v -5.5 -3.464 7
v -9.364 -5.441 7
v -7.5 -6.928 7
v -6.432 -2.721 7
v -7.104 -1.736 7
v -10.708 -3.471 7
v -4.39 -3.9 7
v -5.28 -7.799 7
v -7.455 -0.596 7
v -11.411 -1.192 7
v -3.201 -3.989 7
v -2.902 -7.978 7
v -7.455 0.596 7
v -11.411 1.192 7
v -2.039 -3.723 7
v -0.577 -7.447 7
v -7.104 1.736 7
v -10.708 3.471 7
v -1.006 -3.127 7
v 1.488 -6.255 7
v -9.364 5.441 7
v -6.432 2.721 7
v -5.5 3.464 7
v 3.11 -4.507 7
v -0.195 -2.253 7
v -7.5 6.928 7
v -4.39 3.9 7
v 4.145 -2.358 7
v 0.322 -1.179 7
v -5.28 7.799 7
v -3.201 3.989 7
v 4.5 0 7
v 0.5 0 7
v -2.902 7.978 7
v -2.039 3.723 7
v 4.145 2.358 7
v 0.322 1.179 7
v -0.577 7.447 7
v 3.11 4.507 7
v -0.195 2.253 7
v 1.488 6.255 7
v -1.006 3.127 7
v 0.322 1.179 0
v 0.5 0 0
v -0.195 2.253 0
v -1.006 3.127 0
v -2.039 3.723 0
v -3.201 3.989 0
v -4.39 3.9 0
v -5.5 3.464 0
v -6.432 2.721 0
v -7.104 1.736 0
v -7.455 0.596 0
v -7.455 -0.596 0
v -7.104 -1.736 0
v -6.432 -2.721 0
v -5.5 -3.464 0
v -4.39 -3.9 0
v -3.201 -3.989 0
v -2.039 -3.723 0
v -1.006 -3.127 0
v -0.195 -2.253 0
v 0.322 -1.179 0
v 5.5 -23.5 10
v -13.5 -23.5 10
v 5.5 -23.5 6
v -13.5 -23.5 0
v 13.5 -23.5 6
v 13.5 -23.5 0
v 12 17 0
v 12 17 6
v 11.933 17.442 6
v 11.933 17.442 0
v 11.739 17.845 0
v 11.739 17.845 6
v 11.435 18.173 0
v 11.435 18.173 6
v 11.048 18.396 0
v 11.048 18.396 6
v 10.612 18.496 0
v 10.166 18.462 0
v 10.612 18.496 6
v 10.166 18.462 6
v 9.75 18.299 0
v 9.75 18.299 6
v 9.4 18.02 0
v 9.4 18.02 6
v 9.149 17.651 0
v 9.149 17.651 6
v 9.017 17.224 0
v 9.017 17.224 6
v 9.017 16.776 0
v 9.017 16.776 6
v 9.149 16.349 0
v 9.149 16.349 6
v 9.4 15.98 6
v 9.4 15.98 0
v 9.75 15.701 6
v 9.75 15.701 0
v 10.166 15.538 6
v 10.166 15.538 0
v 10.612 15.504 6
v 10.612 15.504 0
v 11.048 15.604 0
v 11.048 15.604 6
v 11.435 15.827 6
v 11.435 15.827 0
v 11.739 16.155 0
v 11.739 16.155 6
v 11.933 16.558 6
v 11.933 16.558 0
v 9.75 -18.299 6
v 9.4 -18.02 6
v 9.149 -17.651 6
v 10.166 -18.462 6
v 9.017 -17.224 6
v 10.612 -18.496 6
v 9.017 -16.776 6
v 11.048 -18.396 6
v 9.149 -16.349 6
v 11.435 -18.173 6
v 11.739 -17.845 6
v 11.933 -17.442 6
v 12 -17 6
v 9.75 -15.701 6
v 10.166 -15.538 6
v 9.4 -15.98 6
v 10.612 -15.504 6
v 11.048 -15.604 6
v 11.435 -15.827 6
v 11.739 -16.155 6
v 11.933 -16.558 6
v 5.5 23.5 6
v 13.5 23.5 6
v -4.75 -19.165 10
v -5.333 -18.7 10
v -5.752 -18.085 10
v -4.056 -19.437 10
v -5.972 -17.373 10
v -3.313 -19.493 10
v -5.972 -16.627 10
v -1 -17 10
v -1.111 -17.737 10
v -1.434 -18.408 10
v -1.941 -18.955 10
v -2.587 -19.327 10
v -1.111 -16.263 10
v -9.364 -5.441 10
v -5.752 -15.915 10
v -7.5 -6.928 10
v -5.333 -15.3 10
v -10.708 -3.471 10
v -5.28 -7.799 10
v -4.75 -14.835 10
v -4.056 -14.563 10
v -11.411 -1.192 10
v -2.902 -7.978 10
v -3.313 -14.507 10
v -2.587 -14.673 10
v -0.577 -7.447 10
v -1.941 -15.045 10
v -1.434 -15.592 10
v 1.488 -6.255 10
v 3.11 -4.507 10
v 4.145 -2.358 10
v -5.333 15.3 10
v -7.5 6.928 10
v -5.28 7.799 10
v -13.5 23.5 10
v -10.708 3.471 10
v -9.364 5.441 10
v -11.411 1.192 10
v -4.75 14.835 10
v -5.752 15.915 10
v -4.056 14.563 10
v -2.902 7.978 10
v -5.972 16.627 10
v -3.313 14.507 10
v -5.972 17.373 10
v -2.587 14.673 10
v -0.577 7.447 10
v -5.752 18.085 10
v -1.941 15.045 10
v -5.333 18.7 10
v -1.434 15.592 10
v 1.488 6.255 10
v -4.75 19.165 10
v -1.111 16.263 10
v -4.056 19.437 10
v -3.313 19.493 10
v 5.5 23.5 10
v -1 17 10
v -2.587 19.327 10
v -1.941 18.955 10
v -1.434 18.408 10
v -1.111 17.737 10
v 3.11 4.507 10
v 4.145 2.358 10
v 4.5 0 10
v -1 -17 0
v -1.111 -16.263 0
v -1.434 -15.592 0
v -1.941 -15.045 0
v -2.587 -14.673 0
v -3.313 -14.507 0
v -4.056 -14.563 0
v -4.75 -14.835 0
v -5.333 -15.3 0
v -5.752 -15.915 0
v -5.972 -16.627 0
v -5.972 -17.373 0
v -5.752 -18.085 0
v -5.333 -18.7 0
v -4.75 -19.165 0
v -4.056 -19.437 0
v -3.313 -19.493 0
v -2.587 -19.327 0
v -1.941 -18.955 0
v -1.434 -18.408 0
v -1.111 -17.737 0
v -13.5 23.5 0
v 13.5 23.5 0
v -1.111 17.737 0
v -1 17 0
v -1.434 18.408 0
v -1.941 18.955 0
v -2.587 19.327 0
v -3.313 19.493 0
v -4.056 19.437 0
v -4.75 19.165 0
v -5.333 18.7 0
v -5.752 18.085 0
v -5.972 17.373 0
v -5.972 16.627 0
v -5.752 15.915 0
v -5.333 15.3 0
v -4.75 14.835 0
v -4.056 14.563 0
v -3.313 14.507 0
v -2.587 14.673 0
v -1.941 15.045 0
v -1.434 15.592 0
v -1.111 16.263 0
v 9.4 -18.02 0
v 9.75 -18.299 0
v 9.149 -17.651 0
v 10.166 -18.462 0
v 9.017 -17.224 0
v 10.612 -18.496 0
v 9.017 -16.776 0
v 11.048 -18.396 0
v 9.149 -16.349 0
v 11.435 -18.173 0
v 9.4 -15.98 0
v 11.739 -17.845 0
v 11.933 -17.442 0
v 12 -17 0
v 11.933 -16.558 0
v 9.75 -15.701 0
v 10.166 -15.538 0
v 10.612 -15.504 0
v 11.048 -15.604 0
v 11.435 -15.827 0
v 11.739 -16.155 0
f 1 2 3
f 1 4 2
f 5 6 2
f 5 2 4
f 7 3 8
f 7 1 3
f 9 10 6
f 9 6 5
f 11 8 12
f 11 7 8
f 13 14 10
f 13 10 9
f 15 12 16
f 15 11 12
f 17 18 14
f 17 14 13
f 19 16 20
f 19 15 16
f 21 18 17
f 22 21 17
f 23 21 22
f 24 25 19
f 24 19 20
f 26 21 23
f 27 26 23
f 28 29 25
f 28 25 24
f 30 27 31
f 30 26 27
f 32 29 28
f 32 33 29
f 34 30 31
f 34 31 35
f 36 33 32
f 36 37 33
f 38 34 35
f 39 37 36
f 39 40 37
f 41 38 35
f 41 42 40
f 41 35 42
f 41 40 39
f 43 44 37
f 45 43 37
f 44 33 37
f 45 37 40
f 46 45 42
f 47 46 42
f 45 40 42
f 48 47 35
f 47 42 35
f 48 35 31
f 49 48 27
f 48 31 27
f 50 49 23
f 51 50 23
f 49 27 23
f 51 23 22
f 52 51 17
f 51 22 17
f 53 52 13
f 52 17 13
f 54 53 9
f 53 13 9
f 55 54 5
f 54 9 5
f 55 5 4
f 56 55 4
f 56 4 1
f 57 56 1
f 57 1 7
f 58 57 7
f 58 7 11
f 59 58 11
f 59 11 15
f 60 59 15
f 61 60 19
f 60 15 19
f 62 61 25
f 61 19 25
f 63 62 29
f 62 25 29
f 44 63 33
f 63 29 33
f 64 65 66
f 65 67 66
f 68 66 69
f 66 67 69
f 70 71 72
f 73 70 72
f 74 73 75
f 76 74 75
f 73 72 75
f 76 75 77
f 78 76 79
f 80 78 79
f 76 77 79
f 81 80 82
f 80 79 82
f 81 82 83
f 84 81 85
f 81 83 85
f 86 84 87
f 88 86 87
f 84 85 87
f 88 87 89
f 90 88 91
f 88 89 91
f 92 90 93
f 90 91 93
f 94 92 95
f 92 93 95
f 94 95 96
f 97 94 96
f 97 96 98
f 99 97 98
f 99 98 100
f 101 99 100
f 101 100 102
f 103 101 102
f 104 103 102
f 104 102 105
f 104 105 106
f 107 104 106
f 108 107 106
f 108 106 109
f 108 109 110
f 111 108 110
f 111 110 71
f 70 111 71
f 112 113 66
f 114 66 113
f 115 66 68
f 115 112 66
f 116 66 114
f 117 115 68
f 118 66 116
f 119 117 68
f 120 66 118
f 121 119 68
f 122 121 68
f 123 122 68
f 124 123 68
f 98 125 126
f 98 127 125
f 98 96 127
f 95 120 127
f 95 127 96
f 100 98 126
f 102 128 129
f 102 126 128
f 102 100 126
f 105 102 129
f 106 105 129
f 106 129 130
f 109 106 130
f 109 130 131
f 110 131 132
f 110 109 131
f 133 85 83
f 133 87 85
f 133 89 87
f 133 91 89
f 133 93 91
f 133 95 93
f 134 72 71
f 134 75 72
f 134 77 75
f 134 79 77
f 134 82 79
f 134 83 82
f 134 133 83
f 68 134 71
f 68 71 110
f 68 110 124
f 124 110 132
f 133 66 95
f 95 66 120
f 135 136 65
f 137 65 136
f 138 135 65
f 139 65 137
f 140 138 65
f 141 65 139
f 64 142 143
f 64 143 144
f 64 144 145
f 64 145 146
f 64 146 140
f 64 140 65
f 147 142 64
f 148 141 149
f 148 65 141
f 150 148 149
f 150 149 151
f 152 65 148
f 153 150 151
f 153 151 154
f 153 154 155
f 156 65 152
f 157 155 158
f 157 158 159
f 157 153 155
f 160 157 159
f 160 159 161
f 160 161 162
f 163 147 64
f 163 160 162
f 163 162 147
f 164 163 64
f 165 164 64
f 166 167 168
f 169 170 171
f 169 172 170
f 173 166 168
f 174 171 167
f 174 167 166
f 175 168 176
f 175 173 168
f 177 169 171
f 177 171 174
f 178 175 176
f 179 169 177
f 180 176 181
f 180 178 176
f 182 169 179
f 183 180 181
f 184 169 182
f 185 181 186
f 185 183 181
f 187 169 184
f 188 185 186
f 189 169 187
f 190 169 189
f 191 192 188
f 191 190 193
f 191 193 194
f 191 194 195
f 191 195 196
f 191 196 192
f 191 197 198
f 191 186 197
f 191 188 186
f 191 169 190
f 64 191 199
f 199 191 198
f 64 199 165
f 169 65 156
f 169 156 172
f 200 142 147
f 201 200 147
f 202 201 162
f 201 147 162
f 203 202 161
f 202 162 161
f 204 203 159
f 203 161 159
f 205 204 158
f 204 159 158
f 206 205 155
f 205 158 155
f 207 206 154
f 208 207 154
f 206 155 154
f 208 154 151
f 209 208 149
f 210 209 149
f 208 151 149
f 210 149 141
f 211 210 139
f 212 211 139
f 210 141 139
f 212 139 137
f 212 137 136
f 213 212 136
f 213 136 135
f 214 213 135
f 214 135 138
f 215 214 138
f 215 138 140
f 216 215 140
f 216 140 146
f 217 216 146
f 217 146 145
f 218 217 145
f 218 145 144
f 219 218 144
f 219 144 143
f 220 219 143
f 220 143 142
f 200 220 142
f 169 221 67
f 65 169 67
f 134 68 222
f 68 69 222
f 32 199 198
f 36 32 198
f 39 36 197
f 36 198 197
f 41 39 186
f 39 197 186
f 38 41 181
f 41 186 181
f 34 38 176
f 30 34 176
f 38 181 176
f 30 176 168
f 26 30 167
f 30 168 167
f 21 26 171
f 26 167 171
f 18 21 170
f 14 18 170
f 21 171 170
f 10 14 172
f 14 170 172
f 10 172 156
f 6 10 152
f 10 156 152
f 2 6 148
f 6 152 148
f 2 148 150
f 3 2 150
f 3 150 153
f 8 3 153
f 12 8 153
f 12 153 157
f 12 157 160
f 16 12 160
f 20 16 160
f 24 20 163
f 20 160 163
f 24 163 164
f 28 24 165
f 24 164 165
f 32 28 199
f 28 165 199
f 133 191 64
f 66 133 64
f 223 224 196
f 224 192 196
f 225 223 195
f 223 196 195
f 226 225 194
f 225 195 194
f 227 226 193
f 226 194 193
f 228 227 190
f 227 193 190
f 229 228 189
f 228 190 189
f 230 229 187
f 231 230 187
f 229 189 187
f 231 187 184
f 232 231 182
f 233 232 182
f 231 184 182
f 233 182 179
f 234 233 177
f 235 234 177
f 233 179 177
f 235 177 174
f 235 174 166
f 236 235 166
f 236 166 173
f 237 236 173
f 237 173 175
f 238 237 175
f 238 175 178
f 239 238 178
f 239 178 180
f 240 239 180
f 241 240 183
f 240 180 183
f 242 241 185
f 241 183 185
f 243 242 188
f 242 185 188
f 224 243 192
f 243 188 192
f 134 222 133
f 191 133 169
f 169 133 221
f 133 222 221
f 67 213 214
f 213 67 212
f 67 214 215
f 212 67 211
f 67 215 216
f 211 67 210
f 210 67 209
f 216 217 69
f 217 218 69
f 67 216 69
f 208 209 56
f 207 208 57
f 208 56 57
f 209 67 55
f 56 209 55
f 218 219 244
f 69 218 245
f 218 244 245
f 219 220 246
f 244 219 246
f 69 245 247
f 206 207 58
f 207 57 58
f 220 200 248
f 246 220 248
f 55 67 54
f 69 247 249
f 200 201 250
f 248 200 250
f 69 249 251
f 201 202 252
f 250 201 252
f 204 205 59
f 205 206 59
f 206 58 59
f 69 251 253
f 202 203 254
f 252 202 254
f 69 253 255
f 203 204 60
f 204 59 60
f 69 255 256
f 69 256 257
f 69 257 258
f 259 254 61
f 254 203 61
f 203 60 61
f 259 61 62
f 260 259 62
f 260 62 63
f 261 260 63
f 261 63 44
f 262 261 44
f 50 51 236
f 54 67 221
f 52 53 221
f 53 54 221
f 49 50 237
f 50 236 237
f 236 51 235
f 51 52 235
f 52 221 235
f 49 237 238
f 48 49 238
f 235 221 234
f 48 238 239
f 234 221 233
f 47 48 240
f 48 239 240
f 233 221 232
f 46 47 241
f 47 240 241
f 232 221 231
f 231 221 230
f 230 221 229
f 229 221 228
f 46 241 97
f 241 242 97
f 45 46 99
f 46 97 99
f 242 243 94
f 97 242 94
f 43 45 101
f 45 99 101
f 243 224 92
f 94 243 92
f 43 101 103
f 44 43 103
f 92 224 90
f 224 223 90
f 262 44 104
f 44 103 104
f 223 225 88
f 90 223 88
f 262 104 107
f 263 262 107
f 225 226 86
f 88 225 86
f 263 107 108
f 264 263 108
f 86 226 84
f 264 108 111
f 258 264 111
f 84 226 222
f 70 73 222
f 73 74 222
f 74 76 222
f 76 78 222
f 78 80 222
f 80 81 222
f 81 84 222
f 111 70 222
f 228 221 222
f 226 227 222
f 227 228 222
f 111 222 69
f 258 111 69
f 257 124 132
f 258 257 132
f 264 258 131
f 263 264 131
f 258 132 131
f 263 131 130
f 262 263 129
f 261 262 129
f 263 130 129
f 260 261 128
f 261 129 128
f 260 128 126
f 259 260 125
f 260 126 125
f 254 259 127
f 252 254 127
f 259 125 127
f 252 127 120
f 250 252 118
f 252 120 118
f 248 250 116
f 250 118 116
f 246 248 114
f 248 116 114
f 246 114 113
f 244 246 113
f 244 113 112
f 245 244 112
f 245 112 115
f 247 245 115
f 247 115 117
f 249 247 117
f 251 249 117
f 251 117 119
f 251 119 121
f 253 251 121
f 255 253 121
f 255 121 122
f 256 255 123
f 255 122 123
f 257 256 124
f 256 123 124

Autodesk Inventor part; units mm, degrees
ref_plane "YZ Plane" through (0, 0, 0) normal (1, 0, 0) x (0, 1, 0)
ref_plane "XZ Plane" through (0, 0, 0) normal (0, 1, 0) x (-1, 0, 0)
ref_plane "XY Plane" through (0, 0, 0) normal (0, 0, 1) x (1, 0, 0)
sketch "Sketch1" plane through (0, 0, 0) normal (0, 0, 1) x (1, 0, 0)
  line L0 (-13.5, -23.5) -> (13.5, -23.5)
  line L1 (13.5, -23.5) -> (13.5, 23.5)
  line L2 (13.5, 23.5) -> (-13.5, 23.5)
  line L3 (-13.5, 23.5) -> (-13.5, -23.5)
  line L4 (-13.5, -23.5) -> (13.5, 23.5) construction
  line L5 (13.5, -23.5) -> (-13.5, 23.5) construction
  point P0 (0, 0)
  dimension "d0" = 27
  dimension "d1" = 47
extrude "Extrusion1" add sketch "Sketch1" along normal blind 10
sketch "Sketch2" plane through (0, 0, 10) normal (0, 0, 1) x (1, 0, 0)
  line L0 (13.5, -23.5) -> (13.5, 23.5) projected
  line L1 (13.5, 23.5) -> (10.5, 23.5)
  line L2 (13.5, 23.5) -> (-13.5, 23.5) projected
  line L3 (10.5, 23.5) -> (10.5, 17)
  line L4 (10.5, 17) -> (10.5, -17)
  circle A0 centre (10.5, -17) radius 1.5
  circle A1 centre (10.5, 17) radius 1.5
  line L5 (13.5, 23.5) -> (10.5, 23.5)
  line L6 (13.5, 23.5) -> (-3.5, 23.5)
  line L7 (-3.5, 23.5) -> (-3.5, 17)
  circle A2 centre (-3.5, 17) radius 2.5
  line L8 (-3.5, 23.5) -> (-3.5, 0)
  circle A3 centre (-3.5, 0) radius 4
  line L9 (-3.5, 0) -> (-3.5, -15.5)
  line L10 (-3.5, -15.5) -> (-3.5, -17)
  circle A4 centre (-3.5, -17) radius 2.5
  point P0 (0, 0)
  dimension "d4" = 3
  dimension "d5" = 6.5
  dimension "d6" = 34
  dimension "d7" = 3
  dimension "d8" = 3
  dimension "d9" = 17
  dimension "d10" = 6.5
  dimension "d11" = 5
  dimension "d12" = 8
  dimension "d13" = 5
extrude "Extrusion2" cut sketch "Sketch2" against normal through all
sketch "Sketch3" plane through (0, 0, 10) normal (0, 0, 1) x (1, 0, 0)
  circle A0 centre (-3.5, 0) radius 4 projected
  circle A1 centre (-3.5, 0) radius 8
  point P0 (0, 0)
  dimension "d16" = 16
extrude "Extrusion3" cut sketch "Sketch3" against normal blind 3
sketch "Sketch4" plane through (0, 0, 10) normal (0, 0, 1) x (1, 0, 0)
  line L0 (13.5, -23.5) -> (13.5, 23.5) projected
  line L1 (-13.5, -23.5) -> (13.5, -23.5) projected
  line L2 (13.5, 23.5) -> (5.5, 23.5)
  line L3 (5.5, 23.5) -> (5.5, -23.5)
  line L4 (5.5, -23.5) -> (13.5, -23.5)
  line L5 (13.5, -23.5) -> (13.5, 23.5)
  point P0 (0, 0)
  dimension "d19" = 8
extrude "Extrusion4" cut sketch "Sketch4" against normal blind 4
thread "Thread1" size "M3x0.5" class "6H" standard "ANSI Metric M Profile" length 50
thread "Thread2" size "M3x0.5" class "6H" standard "ANSI Metric M Profile" length 50
properties part number "Szorítólap"
